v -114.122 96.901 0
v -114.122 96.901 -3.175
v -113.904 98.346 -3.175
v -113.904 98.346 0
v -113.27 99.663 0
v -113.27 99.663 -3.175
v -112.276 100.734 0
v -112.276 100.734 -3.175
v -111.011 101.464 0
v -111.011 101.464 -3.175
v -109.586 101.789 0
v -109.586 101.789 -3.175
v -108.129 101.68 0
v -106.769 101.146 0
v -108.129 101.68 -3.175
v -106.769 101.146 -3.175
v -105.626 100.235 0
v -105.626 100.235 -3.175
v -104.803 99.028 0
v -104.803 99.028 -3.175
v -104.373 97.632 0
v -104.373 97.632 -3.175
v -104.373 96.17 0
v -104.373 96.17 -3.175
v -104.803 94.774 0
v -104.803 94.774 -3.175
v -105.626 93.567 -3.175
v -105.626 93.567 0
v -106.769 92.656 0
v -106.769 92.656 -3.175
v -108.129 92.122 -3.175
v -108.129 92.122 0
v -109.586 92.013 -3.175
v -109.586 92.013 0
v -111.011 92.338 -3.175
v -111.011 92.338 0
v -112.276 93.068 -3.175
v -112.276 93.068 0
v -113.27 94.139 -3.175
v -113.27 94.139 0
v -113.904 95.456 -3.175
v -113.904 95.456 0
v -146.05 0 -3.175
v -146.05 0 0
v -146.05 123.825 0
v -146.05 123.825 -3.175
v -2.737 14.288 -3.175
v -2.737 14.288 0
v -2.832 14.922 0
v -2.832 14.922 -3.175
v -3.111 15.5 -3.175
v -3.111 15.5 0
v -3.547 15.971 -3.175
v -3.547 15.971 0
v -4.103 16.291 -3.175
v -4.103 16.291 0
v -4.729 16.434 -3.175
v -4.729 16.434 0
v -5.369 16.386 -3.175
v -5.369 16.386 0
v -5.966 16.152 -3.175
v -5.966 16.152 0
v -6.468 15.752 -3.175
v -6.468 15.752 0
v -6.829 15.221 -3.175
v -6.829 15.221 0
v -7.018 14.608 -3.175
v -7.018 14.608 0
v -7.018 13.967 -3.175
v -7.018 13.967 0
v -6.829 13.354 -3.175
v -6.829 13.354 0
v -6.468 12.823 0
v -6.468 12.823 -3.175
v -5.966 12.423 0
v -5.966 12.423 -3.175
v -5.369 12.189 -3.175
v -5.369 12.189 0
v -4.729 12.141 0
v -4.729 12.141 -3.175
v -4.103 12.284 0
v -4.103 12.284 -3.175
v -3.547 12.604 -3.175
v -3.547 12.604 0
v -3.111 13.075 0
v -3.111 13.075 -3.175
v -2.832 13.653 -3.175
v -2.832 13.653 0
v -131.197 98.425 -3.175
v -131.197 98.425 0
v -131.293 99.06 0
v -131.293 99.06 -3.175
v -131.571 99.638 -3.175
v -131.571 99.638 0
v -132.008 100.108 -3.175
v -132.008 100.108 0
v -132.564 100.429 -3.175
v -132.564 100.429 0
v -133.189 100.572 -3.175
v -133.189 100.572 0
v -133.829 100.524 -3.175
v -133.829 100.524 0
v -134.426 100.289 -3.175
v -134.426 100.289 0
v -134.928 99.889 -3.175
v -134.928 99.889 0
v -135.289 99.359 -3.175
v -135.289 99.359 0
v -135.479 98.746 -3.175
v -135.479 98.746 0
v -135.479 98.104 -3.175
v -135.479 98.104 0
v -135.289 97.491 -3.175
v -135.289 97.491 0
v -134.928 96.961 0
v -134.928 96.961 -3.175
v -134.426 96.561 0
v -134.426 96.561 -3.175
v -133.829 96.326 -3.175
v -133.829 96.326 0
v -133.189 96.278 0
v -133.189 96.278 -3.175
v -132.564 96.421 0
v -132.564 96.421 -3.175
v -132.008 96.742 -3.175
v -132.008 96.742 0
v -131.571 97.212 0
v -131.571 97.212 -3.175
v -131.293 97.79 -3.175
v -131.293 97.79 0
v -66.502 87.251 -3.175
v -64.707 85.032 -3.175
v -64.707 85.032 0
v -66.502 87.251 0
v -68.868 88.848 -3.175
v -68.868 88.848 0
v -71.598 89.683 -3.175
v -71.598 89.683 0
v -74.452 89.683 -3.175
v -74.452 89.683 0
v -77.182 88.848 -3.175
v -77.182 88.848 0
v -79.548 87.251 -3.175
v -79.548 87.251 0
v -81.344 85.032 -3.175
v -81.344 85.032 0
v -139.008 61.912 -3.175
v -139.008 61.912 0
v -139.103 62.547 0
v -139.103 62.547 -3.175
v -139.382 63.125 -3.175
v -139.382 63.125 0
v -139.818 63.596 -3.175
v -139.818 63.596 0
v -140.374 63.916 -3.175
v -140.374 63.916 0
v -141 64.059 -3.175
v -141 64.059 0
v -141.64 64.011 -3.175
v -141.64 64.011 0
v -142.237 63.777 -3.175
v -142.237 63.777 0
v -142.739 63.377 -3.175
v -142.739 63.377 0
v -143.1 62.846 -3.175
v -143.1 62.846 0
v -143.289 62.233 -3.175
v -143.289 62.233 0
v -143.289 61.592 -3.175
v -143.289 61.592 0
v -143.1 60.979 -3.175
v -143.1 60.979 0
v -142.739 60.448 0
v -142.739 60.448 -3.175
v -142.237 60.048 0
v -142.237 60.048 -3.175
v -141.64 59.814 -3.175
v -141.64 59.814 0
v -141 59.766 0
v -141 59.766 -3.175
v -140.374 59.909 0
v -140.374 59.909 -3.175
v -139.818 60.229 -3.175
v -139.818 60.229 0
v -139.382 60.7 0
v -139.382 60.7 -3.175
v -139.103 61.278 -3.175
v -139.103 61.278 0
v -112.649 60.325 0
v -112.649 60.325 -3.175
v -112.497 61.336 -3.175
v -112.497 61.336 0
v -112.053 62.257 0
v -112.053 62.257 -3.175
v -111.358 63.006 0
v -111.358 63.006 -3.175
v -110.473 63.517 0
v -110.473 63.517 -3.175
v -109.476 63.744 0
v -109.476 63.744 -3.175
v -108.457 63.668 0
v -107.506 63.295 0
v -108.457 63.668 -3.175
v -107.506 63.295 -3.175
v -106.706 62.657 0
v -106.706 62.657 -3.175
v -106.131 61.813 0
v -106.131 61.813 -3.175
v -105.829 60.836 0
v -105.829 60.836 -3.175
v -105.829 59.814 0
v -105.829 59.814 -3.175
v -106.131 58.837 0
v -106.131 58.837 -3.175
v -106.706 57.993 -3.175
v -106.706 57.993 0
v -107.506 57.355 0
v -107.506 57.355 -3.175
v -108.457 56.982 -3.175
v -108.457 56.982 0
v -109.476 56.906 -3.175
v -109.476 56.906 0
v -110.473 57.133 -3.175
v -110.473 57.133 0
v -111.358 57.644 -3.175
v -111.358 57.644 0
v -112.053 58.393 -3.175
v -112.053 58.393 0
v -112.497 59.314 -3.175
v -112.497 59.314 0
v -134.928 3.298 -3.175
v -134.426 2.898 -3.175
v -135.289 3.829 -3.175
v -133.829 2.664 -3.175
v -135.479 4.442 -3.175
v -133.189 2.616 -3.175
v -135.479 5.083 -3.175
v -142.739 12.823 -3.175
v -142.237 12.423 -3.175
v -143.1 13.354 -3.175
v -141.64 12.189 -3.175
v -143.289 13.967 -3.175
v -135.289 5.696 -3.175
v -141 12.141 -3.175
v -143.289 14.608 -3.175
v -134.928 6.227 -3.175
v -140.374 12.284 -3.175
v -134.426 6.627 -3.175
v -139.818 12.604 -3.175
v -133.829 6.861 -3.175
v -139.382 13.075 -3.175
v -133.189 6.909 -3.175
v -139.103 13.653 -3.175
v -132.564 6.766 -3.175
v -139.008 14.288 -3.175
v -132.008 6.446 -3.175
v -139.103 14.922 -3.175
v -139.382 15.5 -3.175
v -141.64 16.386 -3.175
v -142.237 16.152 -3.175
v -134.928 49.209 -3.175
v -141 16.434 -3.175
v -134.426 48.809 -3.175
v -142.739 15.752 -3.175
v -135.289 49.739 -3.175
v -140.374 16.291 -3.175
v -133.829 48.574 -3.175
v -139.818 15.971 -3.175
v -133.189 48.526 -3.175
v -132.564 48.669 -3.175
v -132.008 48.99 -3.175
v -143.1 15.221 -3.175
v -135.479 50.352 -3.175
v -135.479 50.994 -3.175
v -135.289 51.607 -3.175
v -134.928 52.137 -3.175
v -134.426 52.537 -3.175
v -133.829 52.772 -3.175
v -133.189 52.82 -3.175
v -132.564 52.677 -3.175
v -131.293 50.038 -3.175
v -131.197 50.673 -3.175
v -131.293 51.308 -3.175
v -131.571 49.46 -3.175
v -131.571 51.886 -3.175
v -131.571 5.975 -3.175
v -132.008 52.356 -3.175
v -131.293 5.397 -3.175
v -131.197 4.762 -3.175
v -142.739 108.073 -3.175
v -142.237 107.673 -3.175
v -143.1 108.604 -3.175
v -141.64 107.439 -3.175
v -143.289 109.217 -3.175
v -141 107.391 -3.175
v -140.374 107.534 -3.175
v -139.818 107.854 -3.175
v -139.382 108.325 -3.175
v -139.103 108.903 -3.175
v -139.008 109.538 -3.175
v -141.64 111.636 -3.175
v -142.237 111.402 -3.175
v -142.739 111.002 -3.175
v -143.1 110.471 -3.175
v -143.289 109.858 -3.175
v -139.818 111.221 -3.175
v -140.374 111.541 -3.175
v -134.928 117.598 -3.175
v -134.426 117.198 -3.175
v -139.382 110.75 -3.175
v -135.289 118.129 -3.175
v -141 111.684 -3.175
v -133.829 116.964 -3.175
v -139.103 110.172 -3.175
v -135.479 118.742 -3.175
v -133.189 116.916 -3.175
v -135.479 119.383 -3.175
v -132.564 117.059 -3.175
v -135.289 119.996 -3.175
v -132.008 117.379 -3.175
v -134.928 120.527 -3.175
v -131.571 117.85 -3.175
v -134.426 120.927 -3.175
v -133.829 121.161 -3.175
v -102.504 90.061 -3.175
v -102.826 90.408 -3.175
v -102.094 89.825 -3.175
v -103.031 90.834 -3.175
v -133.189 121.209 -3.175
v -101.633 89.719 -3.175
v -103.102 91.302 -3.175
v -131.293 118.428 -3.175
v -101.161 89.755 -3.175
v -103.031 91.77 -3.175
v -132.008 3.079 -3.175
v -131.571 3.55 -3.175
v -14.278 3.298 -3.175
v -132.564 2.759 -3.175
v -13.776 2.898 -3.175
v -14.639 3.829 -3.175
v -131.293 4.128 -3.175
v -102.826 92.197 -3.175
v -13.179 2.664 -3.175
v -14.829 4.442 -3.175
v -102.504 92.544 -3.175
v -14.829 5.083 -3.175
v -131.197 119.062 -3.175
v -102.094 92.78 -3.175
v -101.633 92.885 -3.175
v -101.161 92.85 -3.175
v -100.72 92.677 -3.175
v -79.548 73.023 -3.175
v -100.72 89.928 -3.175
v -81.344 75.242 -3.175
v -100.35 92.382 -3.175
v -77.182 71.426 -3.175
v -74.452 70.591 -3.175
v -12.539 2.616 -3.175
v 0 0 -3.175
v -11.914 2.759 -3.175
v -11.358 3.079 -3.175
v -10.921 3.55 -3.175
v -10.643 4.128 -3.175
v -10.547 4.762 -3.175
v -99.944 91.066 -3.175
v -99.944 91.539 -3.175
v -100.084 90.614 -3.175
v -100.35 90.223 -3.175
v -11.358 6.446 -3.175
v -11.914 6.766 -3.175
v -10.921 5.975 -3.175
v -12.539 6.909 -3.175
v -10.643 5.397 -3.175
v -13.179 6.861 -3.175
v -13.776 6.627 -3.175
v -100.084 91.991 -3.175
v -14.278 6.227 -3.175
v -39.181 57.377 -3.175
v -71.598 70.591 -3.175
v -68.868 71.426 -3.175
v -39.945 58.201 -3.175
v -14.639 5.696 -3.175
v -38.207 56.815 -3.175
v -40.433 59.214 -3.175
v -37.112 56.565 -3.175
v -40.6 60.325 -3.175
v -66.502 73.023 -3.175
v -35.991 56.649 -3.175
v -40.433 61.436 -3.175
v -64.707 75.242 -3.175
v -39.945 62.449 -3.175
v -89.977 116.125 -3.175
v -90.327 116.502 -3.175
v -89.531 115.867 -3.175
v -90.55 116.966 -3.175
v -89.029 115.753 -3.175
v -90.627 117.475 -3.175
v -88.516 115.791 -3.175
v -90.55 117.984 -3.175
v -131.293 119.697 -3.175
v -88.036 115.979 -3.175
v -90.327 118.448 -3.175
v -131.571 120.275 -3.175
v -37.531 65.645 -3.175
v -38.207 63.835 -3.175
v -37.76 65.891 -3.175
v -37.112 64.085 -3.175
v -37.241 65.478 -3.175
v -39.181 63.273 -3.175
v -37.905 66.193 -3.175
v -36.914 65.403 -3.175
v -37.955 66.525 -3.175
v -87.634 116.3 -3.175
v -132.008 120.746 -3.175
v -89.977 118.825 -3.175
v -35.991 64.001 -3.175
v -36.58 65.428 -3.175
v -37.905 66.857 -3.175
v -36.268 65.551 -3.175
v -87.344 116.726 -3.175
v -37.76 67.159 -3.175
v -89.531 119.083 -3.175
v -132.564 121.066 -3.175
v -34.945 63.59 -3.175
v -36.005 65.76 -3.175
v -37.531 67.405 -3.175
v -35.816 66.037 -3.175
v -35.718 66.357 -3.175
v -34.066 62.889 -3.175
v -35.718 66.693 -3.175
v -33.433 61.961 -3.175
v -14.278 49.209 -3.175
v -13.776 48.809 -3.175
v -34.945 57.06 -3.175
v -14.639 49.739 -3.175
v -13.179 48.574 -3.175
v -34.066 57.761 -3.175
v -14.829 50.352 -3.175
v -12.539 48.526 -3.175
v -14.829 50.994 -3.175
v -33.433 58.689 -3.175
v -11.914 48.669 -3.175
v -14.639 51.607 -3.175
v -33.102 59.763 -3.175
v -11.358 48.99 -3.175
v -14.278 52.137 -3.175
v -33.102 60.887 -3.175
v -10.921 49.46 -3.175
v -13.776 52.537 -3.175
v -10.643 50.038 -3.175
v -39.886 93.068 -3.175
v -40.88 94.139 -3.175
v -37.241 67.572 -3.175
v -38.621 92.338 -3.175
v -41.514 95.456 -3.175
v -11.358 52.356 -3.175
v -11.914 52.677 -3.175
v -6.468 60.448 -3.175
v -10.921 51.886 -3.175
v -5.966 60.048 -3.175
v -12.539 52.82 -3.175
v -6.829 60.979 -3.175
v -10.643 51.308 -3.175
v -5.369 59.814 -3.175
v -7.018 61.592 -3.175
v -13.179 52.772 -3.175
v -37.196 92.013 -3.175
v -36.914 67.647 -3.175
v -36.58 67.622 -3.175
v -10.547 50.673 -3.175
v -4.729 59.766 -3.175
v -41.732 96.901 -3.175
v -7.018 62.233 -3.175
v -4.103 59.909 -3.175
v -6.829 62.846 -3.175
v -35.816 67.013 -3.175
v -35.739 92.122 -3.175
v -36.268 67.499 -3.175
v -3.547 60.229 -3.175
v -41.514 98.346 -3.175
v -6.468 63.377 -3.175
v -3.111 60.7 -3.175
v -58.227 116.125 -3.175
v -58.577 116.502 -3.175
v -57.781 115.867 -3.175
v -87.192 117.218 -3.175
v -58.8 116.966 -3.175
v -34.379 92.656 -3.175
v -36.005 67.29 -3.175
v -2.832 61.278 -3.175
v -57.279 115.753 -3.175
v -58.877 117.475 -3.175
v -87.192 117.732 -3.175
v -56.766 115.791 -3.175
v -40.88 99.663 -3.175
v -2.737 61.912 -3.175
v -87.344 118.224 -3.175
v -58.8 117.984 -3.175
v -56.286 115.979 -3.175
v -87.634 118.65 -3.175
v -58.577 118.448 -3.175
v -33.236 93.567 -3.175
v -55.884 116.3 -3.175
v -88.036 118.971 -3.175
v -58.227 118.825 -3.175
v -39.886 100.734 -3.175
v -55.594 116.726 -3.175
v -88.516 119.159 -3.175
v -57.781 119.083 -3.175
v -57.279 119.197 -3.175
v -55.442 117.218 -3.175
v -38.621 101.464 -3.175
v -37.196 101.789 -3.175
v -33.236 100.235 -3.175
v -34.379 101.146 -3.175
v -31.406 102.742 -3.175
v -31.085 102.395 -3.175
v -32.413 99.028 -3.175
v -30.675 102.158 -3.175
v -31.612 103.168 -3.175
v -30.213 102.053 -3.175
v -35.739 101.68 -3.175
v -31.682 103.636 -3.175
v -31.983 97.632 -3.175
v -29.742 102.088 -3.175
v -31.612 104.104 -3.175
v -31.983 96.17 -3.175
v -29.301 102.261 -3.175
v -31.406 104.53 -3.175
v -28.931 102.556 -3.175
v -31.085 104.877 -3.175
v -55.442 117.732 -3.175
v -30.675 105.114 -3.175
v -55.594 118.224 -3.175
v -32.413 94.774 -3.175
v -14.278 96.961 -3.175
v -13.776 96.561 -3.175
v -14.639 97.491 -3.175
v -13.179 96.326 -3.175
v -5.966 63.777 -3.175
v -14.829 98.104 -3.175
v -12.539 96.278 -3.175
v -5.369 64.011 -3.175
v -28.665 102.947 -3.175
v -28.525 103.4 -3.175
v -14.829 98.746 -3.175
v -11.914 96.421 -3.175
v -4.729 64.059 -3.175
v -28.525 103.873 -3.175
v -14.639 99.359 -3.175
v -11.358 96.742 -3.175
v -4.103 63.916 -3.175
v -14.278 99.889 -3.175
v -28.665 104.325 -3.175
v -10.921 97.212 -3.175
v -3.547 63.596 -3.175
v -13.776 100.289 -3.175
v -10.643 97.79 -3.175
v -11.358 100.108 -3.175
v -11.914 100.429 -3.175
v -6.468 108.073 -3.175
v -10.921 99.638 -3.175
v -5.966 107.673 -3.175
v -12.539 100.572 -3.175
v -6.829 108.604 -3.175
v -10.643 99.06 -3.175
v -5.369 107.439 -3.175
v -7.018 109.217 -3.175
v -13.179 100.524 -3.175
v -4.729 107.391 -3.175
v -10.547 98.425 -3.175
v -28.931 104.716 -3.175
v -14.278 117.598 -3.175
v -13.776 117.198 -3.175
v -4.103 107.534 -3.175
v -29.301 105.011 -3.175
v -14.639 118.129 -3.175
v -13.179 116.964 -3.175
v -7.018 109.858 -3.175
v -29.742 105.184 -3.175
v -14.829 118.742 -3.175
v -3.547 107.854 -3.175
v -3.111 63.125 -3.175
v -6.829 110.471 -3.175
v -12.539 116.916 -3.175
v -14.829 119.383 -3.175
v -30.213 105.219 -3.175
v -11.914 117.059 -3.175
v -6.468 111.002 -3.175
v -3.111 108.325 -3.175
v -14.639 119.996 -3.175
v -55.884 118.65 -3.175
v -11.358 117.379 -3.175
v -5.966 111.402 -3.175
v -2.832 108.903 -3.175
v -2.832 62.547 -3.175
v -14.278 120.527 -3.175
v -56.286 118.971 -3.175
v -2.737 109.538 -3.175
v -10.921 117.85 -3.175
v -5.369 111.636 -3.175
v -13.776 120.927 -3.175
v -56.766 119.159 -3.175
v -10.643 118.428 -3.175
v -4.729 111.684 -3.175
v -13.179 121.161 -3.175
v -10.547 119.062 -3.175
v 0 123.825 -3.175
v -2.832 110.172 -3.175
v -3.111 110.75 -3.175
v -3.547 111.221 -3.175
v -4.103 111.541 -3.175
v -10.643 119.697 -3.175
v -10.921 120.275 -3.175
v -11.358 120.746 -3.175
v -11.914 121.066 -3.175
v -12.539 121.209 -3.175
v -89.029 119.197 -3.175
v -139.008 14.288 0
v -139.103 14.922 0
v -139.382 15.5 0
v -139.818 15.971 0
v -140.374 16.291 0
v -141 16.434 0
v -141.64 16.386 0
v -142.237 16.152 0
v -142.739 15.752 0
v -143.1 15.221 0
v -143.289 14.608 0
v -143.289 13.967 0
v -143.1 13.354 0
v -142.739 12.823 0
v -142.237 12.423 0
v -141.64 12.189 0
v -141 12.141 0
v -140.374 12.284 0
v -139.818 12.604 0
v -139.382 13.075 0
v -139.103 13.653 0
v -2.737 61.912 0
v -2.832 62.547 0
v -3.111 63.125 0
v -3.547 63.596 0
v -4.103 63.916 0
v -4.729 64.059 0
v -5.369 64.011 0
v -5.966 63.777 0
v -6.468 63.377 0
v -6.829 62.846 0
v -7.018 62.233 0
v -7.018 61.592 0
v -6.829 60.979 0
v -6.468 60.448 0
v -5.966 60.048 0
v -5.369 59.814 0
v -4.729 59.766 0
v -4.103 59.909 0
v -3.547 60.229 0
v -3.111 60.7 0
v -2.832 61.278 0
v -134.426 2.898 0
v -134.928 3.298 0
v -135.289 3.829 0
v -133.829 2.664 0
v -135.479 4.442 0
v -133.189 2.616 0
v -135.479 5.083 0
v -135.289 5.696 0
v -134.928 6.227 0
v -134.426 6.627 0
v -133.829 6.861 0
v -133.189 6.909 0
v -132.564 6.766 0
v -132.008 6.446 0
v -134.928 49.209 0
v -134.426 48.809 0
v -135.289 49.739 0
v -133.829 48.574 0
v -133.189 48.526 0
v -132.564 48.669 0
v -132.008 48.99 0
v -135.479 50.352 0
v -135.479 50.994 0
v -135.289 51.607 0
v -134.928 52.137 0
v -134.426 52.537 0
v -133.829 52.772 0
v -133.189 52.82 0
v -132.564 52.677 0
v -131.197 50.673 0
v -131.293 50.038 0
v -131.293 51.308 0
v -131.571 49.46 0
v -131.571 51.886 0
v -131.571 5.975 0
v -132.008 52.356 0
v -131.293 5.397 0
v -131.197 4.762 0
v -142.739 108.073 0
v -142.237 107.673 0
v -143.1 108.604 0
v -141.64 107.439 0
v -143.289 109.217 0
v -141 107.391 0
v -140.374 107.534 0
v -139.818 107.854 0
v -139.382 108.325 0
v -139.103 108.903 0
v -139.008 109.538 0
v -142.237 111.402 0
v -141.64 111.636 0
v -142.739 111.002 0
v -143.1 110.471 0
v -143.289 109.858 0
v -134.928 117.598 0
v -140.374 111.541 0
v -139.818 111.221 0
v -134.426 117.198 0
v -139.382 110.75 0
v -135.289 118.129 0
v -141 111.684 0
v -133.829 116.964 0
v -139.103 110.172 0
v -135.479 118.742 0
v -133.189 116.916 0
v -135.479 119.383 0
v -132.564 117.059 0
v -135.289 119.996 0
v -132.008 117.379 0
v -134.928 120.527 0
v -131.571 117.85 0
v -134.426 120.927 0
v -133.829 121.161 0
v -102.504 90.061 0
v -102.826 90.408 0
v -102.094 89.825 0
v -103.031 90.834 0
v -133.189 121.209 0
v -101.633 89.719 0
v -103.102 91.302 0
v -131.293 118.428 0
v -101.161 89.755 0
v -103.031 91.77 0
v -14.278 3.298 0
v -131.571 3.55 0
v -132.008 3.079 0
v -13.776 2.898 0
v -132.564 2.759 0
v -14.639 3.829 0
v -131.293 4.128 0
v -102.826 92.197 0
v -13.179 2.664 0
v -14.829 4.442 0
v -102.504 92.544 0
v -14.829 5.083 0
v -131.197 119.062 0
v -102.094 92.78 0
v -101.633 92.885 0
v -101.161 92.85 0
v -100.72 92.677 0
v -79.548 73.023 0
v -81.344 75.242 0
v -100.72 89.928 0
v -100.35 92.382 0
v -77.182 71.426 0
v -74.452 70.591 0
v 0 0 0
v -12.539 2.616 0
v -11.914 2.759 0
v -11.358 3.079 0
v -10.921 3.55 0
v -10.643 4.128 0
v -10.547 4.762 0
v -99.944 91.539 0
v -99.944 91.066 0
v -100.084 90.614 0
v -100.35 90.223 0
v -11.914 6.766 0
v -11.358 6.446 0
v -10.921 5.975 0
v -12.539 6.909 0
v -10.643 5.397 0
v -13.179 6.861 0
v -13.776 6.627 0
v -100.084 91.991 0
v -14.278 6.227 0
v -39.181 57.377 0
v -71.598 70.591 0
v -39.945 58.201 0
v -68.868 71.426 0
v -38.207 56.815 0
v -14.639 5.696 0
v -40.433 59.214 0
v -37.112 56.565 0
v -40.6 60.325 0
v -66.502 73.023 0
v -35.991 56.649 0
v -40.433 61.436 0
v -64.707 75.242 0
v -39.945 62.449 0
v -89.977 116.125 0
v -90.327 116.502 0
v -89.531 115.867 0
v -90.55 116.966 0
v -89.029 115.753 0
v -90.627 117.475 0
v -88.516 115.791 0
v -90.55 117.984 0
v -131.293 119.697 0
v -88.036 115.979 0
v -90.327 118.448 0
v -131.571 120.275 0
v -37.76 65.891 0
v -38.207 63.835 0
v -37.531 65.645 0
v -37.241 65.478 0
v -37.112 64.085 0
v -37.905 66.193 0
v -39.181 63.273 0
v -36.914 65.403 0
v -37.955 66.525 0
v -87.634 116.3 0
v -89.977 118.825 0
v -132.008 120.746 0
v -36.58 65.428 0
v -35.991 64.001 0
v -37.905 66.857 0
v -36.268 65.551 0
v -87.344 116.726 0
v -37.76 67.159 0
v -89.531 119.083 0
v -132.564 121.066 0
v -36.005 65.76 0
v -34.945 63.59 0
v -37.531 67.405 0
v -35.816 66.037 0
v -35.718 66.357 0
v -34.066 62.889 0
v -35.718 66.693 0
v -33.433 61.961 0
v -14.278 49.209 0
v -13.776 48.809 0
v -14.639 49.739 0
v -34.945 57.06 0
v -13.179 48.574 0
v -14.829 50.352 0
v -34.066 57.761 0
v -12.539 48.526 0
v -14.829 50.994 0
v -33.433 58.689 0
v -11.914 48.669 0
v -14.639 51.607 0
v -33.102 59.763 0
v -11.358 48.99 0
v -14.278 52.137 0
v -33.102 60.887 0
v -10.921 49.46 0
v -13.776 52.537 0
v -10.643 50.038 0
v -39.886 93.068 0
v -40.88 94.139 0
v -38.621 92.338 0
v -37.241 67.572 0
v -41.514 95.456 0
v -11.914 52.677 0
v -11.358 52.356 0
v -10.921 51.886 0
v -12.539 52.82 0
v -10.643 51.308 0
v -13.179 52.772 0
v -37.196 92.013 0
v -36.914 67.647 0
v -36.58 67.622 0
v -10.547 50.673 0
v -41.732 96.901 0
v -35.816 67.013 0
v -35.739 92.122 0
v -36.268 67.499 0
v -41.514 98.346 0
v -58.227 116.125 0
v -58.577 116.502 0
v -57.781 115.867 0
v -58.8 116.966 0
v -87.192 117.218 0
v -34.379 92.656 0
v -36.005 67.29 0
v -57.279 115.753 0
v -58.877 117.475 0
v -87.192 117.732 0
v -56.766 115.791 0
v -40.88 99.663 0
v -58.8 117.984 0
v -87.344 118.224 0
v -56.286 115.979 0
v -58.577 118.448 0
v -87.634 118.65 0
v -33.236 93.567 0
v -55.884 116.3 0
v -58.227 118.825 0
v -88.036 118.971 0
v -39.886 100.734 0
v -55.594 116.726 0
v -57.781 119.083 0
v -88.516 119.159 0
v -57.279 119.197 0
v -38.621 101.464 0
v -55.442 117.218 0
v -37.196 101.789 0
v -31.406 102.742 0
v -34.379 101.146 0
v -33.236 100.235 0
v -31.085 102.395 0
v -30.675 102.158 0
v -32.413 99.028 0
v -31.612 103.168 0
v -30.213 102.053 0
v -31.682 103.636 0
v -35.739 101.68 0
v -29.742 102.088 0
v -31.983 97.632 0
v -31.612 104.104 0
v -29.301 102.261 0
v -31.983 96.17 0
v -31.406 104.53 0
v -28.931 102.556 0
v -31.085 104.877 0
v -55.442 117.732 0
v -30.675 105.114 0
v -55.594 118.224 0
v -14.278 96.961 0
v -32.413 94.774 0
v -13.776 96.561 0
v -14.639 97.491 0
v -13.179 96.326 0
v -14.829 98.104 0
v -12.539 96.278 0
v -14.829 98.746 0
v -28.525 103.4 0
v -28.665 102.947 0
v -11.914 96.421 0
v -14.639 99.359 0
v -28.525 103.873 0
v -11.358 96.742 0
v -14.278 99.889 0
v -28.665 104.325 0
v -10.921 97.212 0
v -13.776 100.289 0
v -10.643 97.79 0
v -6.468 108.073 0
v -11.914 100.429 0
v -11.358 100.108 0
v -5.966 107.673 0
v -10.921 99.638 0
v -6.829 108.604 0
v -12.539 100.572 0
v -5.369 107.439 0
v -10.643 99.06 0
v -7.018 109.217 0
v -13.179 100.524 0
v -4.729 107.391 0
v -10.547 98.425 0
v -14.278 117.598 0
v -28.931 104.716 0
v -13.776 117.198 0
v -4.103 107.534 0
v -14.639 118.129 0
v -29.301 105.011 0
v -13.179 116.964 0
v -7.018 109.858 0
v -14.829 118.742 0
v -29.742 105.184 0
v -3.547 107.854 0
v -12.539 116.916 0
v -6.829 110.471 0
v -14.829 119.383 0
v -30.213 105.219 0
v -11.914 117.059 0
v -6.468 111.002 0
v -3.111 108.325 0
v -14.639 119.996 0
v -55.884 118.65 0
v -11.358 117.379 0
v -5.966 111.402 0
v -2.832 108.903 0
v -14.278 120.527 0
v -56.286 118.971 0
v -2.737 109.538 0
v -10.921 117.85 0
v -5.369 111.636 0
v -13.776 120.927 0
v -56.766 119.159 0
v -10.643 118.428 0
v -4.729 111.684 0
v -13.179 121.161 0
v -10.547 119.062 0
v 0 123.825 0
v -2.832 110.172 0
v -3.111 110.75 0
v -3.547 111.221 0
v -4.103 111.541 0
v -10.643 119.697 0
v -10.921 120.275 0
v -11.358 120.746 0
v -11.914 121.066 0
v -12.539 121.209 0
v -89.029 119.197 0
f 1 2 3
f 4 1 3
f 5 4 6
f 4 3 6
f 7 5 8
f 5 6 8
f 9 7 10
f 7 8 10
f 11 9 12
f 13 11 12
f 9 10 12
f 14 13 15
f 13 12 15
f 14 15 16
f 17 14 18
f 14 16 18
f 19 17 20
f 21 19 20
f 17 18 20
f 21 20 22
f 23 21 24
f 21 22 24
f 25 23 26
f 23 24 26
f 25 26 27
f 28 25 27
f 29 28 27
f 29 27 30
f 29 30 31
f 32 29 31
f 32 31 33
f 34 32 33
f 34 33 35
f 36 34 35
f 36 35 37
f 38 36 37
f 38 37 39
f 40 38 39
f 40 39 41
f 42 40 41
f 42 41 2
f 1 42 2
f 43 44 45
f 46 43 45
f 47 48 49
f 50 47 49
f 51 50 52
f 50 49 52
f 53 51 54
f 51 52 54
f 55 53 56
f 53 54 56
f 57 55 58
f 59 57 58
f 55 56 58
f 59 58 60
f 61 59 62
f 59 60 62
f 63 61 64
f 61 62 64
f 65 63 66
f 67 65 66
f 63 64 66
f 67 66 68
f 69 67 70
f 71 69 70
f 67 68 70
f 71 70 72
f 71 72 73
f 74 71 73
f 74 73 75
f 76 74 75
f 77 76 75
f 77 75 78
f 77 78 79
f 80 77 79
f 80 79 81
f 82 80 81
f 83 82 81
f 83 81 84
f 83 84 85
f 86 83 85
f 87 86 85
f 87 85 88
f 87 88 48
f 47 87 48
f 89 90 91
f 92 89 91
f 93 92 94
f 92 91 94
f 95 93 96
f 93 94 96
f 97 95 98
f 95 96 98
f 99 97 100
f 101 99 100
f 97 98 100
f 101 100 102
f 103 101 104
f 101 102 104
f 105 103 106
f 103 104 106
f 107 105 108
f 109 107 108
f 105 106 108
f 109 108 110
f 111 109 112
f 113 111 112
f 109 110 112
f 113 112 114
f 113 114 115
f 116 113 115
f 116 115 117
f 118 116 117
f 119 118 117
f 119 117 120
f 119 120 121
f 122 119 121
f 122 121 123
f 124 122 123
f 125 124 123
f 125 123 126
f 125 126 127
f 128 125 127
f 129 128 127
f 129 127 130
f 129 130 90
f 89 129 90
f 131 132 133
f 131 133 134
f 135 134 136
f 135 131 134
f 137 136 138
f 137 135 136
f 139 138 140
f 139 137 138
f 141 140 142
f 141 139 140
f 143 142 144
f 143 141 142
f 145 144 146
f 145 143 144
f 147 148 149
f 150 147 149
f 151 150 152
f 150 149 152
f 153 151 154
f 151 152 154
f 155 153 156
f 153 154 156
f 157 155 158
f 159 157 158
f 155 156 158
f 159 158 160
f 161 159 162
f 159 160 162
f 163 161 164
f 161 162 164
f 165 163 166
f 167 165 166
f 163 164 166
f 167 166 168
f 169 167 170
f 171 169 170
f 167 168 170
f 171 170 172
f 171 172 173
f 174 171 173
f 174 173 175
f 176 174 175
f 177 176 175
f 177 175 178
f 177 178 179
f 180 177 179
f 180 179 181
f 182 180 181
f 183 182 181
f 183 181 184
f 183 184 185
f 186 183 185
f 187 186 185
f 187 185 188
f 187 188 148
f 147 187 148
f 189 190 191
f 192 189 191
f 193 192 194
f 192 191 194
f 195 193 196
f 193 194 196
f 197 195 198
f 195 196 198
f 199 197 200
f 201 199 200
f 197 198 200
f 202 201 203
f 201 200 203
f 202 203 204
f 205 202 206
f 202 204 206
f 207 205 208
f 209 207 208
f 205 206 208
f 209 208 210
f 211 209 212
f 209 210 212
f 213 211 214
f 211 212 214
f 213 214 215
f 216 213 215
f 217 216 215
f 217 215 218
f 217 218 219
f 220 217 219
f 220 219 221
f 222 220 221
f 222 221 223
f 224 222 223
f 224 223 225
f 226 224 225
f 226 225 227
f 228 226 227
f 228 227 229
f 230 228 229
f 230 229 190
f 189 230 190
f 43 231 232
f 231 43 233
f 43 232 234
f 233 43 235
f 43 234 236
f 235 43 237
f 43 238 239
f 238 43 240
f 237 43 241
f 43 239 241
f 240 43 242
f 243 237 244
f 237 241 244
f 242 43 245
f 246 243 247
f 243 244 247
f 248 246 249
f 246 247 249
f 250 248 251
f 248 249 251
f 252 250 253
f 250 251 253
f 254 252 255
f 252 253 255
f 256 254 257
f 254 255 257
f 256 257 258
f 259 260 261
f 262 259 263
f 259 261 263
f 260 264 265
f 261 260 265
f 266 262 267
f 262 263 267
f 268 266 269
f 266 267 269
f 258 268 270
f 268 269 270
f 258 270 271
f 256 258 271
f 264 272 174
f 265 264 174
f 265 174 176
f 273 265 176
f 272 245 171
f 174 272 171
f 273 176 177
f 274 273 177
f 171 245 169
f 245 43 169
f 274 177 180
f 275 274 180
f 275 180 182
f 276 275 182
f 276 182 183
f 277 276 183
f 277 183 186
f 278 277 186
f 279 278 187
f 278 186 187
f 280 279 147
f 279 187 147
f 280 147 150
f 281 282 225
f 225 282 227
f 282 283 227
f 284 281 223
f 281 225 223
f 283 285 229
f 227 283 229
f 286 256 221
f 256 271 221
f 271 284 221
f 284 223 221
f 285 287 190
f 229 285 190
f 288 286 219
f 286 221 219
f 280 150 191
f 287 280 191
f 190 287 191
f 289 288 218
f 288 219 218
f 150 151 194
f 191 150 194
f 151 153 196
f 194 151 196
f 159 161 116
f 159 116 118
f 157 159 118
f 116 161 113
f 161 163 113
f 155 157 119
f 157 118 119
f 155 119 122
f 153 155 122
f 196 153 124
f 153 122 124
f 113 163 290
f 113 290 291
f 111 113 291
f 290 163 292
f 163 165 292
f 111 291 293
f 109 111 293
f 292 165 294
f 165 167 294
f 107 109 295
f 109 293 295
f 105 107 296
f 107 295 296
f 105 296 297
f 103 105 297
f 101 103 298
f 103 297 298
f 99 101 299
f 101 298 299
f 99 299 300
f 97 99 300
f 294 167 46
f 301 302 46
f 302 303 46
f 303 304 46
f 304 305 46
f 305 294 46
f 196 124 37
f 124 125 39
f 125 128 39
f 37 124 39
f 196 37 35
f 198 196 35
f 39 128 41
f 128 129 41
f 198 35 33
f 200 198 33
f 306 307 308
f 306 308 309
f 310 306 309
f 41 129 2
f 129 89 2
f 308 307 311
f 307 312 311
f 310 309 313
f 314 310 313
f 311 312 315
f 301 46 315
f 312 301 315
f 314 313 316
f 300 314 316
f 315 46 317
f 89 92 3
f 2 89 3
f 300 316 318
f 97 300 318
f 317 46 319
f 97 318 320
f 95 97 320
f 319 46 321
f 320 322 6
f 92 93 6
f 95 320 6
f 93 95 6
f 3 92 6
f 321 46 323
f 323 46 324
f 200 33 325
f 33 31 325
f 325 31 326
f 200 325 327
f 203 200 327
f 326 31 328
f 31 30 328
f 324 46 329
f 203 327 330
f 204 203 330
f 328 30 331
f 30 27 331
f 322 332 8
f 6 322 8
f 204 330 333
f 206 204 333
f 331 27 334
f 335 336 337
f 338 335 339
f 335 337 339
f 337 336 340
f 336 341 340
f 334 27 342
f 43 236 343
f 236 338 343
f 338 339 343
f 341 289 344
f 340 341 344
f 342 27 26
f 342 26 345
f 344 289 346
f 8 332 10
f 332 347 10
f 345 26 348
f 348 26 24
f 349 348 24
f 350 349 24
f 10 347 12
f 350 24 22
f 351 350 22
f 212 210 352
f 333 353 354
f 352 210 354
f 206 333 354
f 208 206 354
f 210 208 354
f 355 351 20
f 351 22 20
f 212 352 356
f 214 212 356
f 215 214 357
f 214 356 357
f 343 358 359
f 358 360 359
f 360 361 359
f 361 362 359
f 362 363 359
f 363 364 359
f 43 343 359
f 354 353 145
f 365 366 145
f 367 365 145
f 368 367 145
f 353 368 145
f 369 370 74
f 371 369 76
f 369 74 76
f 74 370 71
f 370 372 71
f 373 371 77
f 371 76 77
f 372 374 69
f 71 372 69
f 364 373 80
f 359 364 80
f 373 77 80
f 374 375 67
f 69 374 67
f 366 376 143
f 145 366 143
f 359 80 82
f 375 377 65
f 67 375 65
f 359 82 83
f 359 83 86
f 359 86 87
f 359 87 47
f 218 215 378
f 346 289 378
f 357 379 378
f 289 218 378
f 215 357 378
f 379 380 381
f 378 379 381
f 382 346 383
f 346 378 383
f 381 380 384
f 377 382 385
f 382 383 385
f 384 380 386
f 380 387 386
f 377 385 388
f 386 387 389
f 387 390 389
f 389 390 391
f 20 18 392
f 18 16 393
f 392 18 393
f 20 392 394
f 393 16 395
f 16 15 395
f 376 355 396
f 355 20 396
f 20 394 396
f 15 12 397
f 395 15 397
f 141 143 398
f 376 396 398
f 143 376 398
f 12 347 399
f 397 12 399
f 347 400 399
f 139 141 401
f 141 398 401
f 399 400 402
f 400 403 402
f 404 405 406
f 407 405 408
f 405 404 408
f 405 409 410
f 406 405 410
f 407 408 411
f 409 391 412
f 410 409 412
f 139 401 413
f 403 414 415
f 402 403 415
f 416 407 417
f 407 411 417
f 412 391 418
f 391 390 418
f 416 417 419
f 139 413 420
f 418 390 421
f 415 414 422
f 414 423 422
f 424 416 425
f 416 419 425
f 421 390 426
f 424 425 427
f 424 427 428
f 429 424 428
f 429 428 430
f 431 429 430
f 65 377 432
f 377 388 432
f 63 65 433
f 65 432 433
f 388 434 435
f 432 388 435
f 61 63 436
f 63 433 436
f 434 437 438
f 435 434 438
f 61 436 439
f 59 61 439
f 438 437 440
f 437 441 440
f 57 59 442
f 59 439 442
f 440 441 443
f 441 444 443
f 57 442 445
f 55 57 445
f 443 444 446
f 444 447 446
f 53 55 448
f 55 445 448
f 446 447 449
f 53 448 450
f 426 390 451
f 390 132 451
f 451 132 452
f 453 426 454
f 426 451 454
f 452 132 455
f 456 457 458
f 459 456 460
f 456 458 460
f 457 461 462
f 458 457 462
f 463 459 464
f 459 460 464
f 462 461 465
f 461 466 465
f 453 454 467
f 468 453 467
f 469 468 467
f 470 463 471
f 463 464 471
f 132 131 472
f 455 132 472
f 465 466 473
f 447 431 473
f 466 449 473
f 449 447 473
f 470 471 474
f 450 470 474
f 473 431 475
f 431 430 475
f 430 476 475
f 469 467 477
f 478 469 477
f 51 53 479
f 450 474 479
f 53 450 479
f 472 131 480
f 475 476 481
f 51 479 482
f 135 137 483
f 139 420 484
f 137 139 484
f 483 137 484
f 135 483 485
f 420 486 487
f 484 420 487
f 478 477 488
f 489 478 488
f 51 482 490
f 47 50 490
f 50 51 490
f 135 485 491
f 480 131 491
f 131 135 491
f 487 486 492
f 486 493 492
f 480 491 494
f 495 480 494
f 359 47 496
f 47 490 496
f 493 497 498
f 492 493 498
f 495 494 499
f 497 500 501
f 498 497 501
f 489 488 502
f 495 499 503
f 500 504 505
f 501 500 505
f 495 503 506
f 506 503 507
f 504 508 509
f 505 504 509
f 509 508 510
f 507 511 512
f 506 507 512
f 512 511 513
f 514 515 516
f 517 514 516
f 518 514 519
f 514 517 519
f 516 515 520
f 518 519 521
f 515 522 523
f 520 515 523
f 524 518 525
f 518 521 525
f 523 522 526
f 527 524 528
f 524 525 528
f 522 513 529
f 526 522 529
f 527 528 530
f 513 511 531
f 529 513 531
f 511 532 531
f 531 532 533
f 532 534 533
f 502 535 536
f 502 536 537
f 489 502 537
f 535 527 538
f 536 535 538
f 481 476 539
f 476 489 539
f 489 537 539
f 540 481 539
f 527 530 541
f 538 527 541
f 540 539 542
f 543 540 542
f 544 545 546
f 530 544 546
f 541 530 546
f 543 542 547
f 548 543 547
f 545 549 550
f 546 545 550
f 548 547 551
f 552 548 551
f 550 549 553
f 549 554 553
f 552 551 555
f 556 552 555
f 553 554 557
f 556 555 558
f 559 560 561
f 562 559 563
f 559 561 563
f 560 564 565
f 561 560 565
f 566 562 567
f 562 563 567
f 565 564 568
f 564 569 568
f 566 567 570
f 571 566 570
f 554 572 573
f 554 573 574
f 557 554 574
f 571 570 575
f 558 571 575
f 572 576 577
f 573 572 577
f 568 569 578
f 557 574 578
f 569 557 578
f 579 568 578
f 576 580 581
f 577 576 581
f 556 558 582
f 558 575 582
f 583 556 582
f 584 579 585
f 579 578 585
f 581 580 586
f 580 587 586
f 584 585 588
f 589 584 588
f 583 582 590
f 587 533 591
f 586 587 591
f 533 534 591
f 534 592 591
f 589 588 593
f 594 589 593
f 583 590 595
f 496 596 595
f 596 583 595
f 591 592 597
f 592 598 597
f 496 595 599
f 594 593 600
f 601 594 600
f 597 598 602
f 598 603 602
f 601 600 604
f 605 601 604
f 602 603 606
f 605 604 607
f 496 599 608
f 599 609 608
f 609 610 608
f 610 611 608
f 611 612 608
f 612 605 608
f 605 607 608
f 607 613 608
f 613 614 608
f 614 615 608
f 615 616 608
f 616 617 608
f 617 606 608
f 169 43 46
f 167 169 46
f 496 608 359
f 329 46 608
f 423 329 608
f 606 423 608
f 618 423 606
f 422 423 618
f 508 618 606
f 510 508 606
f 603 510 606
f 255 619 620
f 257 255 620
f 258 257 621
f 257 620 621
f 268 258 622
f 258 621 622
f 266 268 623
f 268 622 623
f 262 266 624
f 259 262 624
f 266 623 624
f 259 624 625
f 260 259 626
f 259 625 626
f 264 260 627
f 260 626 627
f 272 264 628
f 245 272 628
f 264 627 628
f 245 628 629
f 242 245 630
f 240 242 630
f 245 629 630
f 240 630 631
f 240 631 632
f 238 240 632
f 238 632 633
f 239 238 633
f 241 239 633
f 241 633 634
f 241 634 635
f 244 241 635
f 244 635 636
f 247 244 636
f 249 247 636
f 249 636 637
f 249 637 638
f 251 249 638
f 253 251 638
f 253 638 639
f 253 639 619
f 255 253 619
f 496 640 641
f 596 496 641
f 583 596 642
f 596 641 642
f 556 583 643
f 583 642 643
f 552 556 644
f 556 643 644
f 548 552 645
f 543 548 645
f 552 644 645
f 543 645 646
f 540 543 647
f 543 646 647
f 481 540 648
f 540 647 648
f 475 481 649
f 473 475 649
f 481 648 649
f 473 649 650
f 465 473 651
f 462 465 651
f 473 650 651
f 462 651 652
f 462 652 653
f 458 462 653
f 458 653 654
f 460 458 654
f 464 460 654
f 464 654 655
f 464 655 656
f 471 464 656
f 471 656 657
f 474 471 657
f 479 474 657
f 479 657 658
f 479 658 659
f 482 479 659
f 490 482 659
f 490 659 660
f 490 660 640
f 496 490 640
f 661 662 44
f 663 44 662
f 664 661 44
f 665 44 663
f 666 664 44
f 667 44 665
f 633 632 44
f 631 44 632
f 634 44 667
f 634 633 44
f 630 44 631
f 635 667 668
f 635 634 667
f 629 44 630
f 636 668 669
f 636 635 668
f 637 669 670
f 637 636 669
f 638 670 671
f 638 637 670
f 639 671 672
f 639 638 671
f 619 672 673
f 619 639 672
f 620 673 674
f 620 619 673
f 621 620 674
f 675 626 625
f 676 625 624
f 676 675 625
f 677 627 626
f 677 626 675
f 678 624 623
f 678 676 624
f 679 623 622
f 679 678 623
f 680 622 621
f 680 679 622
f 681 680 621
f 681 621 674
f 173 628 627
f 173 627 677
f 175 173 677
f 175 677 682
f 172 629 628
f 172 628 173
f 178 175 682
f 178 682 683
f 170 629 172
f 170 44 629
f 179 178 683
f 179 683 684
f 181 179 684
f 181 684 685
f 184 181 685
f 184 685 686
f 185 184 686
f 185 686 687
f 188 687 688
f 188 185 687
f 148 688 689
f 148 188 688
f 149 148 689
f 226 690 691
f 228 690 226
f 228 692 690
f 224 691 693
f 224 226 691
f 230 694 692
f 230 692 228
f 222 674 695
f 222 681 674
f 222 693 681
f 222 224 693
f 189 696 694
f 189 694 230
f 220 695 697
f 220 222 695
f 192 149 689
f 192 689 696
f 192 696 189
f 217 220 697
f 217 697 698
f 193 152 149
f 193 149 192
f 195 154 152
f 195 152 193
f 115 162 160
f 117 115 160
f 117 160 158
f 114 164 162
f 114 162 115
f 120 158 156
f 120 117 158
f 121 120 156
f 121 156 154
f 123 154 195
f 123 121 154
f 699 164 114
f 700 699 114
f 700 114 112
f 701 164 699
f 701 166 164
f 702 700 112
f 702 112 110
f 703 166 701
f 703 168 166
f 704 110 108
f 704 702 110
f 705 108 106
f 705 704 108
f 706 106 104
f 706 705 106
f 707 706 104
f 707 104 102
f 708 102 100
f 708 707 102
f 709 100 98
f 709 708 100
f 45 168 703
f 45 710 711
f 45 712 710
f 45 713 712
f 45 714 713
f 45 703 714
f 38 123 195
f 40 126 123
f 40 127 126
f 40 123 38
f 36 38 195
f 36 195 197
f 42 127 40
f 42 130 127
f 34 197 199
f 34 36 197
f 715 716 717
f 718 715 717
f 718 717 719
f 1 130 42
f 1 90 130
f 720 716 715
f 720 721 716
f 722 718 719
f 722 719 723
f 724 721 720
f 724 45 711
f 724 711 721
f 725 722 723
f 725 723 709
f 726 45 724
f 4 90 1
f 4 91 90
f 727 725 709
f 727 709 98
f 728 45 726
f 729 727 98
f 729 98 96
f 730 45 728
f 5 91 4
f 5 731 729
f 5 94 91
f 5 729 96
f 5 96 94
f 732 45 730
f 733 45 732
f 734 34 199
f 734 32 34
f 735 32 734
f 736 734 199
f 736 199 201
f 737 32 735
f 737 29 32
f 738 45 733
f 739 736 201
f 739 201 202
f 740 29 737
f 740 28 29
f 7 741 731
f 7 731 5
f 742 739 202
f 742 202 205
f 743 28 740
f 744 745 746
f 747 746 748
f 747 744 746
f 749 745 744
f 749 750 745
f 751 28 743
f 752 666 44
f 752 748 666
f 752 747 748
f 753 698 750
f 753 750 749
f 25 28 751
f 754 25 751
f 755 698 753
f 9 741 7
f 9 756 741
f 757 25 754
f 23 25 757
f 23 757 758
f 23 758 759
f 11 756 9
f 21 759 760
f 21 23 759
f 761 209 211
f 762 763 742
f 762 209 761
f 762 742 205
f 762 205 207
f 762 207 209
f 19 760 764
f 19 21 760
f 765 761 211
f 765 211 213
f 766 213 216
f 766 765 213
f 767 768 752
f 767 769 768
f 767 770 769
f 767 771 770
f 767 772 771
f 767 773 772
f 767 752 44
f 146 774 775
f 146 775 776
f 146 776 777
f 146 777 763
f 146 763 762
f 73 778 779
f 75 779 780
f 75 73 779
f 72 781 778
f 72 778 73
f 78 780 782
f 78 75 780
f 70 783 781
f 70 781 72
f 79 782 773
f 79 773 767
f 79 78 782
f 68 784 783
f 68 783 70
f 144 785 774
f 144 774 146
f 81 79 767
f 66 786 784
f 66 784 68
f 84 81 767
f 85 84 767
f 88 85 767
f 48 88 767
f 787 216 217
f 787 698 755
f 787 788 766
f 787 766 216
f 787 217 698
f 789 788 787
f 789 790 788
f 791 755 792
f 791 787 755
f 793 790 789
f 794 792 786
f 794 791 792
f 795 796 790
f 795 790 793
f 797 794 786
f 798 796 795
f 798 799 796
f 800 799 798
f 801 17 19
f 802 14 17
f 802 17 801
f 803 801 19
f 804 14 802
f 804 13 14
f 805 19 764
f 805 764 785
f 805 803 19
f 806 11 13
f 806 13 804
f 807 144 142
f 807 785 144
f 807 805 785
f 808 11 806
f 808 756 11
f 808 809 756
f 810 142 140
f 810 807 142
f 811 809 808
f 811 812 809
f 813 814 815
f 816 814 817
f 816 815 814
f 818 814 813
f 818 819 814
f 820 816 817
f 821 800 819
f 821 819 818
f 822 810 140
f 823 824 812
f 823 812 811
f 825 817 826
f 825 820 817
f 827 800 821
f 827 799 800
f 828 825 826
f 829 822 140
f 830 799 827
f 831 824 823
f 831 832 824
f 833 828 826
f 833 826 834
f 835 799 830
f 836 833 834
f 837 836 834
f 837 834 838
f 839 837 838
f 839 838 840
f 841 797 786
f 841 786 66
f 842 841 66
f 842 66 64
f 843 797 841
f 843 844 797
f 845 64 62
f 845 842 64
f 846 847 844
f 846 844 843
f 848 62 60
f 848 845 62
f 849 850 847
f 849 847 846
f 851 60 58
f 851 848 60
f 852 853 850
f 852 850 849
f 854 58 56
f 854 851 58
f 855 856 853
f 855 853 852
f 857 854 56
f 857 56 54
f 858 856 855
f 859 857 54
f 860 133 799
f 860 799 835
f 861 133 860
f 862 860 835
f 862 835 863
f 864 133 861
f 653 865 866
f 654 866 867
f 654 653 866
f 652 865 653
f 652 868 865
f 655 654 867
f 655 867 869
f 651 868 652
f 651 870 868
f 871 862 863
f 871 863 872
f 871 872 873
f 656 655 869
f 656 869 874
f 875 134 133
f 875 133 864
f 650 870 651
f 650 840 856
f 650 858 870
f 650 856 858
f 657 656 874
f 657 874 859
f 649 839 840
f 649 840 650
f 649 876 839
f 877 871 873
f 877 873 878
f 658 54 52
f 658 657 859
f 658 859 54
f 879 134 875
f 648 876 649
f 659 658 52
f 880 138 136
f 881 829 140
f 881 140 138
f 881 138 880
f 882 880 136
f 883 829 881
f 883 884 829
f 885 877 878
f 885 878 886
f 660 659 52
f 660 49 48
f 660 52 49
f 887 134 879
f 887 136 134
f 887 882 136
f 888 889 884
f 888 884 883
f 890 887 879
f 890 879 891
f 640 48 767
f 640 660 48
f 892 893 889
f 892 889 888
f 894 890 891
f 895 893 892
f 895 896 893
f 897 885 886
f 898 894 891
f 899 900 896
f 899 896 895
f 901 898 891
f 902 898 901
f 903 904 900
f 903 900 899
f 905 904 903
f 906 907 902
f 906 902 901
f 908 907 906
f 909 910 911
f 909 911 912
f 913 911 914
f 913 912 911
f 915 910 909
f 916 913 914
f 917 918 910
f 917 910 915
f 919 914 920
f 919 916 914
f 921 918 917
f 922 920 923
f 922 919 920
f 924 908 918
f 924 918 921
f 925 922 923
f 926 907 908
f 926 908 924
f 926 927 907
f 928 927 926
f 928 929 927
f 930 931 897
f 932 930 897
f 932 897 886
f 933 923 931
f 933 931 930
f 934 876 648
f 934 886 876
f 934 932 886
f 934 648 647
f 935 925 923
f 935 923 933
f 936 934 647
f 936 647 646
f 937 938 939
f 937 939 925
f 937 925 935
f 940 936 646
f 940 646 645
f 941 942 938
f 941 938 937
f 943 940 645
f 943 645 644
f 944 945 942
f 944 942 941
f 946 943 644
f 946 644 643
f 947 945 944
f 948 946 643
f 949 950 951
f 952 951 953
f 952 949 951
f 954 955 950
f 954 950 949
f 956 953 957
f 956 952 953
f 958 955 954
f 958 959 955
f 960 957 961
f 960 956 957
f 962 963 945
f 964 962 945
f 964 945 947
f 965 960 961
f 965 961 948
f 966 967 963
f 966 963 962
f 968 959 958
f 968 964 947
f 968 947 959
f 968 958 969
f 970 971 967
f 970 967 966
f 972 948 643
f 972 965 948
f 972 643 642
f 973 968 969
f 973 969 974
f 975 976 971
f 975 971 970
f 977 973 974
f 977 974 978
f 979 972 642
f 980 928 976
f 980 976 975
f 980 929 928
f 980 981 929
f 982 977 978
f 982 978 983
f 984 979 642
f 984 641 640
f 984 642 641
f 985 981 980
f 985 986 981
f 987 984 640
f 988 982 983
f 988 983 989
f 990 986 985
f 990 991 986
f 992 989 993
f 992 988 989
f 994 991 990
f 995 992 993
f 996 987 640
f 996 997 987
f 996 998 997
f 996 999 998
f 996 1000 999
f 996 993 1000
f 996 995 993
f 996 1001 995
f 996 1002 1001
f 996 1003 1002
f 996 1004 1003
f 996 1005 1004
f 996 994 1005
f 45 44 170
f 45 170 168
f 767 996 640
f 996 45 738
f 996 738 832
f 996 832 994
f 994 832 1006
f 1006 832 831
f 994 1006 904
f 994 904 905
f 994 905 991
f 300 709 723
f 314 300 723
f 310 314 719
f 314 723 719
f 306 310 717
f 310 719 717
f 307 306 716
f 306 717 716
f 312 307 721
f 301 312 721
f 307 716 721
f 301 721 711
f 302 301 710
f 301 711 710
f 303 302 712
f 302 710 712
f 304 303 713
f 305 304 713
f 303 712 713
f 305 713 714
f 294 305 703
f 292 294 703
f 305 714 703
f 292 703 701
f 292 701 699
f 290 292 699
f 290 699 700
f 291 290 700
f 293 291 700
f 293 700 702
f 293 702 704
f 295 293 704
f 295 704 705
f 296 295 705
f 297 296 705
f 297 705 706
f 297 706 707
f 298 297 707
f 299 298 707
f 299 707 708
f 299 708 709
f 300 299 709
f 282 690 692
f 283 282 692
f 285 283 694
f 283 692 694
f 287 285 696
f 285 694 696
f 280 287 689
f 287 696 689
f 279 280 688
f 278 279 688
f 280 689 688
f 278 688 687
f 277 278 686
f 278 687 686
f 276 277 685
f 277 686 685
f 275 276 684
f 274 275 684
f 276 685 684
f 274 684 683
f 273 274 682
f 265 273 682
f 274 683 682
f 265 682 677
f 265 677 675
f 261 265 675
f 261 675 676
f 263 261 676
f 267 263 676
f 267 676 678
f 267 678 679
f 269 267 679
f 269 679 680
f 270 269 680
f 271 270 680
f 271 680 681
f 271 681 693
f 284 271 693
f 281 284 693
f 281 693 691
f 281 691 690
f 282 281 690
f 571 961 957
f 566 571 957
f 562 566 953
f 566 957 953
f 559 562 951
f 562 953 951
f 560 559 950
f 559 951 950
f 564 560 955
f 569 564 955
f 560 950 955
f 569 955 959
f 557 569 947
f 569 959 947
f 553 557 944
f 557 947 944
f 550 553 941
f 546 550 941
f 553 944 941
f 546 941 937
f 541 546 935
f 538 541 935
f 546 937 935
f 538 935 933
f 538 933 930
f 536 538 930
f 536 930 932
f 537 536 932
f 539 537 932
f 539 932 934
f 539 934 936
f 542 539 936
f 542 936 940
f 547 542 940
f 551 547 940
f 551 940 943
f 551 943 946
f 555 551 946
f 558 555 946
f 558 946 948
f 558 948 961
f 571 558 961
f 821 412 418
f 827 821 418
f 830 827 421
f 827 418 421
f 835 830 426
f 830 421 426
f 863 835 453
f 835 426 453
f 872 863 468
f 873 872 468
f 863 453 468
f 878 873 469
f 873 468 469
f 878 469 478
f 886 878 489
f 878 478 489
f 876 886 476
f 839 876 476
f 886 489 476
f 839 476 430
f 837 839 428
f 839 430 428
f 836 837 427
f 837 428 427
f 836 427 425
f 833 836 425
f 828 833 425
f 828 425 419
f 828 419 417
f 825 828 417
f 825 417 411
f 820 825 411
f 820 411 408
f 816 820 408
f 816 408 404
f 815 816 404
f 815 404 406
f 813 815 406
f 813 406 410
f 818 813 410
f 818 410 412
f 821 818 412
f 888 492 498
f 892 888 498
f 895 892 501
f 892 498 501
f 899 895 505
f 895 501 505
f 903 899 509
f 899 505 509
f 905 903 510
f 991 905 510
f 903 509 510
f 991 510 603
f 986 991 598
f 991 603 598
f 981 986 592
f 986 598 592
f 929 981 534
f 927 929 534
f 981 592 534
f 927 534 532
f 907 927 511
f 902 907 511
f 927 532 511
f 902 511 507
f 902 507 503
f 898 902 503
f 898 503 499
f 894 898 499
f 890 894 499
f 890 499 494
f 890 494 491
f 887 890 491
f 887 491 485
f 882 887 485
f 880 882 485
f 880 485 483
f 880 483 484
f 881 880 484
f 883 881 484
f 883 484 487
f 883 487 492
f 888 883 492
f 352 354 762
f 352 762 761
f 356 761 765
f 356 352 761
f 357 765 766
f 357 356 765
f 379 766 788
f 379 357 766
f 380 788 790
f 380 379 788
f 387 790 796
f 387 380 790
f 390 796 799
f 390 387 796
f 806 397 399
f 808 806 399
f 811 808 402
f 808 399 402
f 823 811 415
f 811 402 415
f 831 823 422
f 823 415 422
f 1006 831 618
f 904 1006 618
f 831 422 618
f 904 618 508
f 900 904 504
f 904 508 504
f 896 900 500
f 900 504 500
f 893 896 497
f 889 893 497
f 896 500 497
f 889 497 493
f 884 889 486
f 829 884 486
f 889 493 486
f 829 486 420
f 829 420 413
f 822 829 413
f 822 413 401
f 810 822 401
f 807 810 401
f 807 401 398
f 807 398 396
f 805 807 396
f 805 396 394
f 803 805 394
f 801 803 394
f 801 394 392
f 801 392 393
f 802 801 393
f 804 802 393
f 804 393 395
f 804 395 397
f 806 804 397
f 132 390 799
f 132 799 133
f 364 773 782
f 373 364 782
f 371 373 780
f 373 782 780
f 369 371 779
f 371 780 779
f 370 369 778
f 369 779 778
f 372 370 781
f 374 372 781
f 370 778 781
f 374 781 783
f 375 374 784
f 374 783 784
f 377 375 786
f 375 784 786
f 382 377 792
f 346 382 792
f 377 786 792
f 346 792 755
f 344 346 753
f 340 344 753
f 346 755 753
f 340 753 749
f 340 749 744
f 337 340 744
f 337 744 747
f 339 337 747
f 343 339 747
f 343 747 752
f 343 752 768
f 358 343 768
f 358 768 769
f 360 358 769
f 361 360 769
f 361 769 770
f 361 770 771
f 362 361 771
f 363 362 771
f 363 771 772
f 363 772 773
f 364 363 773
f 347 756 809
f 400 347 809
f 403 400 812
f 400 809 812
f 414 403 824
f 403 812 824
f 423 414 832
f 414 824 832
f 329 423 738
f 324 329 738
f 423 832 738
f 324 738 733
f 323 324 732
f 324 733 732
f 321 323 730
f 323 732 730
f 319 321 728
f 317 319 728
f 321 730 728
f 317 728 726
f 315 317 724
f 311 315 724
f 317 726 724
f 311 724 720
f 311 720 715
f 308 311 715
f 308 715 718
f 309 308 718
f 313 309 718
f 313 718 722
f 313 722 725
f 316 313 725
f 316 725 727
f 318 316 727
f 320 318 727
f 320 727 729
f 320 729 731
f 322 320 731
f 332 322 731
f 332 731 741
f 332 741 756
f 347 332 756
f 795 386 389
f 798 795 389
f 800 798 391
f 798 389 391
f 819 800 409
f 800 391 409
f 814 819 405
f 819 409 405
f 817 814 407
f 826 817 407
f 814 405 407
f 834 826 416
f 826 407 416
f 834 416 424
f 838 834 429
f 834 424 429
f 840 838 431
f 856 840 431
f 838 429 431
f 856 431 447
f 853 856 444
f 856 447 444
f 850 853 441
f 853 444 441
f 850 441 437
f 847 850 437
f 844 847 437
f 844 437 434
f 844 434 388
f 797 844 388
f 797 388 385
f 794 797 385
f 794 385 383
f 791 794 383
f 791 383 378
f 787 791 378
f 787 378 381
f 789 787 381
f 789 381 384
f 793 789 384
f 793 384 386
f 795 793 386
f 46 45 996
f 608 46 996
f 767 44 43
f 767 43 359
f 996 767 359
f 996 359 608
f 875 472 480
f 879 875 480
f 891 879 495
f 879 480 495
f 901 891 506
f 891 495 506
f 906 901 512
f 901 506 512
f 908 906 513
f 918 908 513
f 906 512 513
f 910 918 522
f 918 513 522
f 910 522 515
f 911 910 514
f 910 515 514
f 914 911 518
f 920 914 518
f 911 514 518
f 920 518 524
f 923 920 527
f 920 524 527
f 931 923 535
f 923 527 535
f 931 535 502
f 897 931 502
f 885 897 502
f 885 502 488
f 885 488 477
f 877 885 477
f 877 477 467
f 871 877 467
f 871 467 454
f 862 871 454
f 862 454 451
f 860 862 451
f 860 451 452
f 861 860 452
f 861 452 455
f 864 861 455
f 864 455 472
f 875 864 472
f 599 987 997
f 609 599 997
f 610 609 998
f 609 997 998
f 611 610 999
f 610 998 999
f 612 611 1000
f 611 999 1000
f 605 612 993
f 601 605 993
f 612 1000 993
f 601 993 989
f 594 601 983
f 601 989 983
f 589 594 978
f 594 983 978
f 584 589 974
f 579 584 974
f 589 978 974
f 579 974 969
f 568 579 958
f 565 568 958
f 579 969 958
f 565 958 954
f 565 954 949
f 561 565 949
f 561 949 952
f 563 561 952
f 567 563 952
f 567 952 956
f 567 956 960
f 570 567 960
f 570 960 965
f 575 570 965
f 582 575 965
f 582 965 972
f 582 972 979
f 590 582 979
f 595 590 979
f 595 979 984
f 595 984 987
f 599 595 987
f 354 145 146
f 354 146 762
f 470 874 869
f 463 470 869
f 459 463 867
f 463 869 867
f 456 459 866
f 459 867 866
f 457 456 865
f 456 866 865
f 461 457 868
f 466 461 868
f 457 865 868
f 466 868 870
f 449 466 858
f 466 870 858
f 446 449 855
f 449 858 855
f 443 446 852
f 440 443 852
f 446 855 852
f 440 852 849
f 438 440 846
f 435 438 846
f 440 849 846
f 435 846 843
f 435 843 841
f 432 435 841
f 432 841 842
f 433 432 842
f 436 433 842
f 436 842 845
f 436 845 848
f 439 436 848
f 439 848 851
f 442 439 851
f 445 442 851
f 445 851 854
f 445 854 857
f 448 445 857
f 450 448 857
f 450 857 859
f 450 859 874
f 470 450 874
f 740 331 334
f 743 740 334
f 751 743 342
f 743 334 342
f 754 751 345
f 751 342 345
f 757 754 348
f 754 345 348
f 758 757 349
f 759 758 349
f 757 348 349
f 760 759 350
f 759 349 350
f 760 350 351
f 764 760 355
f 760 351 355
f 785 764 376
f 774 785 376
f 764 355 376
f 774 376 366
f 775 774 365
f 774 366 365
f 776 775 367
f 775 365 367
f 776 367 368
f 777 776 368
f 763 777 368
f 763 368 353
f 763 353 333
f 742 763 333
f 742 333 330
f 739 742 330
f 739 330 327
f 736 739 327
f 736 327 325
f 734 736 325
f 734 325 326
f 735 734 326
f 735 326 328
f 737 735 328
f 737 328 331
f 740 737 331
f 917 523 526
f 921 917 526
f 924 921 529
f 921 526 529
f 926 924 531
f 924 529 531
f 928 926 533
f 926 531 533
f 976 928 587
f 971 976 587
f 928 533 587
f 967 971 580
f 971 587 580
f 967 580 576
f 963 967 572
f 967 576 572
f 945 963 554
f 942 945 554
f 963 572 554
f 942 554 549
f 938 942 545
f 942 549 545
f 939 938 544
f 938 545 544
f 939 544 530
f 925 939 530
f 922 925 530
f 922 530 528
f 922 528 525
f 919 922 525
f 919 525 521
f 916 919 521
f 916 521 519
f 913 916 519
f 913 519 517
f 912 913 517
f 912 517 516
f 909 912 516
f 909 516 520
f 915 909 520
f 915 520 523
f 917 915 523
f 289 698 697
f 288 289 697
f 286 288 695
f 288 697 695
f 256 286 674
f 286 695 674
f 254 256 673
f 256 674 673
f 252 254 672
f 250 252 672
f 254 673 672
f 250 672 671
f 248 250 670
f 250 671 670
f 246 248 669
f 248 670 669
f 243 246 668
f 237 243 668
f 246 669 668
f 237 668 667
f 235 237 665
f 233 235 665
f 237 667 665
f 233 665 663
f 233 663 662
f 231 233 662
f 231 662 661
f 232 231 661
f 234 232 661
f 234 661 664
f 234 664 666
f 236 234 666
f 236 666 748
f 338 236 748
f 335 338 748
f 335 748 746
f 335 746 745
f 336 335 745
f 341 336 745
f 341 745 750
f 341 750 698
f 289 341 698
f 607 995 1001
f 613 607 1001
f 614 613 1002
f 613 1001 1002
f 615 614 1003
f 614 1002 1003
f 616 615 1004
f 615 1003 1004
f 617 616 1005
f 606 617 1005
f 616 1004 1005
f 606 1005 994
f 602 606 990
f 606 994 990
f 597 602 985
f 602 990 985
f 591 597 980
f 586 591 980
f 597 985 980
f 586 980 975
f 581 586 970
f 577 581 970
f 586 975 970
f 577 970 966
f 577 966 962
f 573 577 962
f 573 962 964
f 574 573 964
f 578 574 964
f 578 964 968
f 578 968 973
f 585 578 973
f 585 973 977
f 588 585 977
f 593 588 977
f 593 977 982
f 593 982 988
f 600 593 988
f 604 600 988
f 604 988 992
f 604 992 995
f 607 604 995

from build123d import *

# Parameters (mm, degrees)
SKETCH1_W                = 146.05
SKETCH1_H                = 123.825
BOSS_EXTRUDE1_DEPTH      = 3.175
F_6_CLEARANCE_HOLE1_D    = 4.3053
SKETCH4_R                = 4.9022
SKETCH4_R_2              = 3.7703125
SKETCH4_R_3              = 3.429
SKETCH4_R_4              = 1.125
SKETCH4_R_5              = 1.5875
SWITCH_MOUNT_HOLES_DEPTH = 4.175
F_4_CLEARANCE_HOLE1_D    = 3.4544


with BuildPart() as part:
    # Sketch1 → Boss-Extrude1 (new body)
    with BuildSketch(Plane.XY):
        with Locations((-73.025, 61.9125)):
            Rectangle(SKETCH1_W, SKETCH1_H)
    extrude(amount=-BOSS_EXTRUDE1_DEPTH)

    # #6 Clearance Hole1 (through all)
    with Locations(Plane(origin=(0, 0, -3.175), x_dir=(-1, 0, 0), z_dir=(0, 0, -1))):
        with Locations((12.7, 119.0625), (133.35, 119.0625), (141.1605, 109.5375), (133.35, 98.425), (141.1605, 61.9125), (133.35, 50.673), (133.35, 4.7625), (12.7, 4.7625), (12.7, 50.673), (12.7, 98.425), (4.8895, 109.5375), (141.1605, 14.2875), (4.8895, 14.2875), (4.8895, 61.9125)):
            Hole(F_6_CLEARANCE_HOLE1_D / 2)

    # Sketch4 → Switch Mount Holes (cut, through all)
    with BuildSketch(Plane(origin=(0, 0, -3.175), x_dir=(-1, 0, 0), z_dir=(0, 0, -1))):
        with Locations((36.83, 96.901)):
            Circle(SKETCH4_R)
        with Locations((36.83, 60.325)):
            Circle(SKETCH4_R_2)
        with Locations((109.22, 60.325)):
            Circle(SKETCH4_R_3)
        with Locations((109.22, 96.901)):
            Circle(SKETCH4_R)
        with Locations((36.830000027, 66.525)):
            Circle(SKETCH4_R_4)
        with Locations((101.514113129, 91.302345472)):
            Circle(SKETCH4_R_5)
        with Locations((30.094807909, 103.636192091)):
            Circle(SKETCH4_R_5)
        with BuildLine():
            Line((81.3435, 85.032269324), (81.3435, 75.241730676))
            ThreePointArc((81.3435, 75.241730676), (73.025, 70.485), (64.7065, 75.241730676))
            Line((64.7065, 75.241730676), (64.7065, 85.032269324))
            ThreePointArc((64.7065, 85.032269324), (73.025, 89.789), (81.3435, 85.032269324))
        make_face()
    extrude(amount=-SWITCH_MOUNT_HOLES_DEPTH, mode=Mode.SUBTRACT)

    # #4 Clearance Hole1 (through all)
    with Locations(Plane.XY):
        with Locations((-88.9, 117.475), (-57.15, 117.475)):
            Hole(F_4_CLEARANCE_HOLE1_D / 2)


solid = part.part
